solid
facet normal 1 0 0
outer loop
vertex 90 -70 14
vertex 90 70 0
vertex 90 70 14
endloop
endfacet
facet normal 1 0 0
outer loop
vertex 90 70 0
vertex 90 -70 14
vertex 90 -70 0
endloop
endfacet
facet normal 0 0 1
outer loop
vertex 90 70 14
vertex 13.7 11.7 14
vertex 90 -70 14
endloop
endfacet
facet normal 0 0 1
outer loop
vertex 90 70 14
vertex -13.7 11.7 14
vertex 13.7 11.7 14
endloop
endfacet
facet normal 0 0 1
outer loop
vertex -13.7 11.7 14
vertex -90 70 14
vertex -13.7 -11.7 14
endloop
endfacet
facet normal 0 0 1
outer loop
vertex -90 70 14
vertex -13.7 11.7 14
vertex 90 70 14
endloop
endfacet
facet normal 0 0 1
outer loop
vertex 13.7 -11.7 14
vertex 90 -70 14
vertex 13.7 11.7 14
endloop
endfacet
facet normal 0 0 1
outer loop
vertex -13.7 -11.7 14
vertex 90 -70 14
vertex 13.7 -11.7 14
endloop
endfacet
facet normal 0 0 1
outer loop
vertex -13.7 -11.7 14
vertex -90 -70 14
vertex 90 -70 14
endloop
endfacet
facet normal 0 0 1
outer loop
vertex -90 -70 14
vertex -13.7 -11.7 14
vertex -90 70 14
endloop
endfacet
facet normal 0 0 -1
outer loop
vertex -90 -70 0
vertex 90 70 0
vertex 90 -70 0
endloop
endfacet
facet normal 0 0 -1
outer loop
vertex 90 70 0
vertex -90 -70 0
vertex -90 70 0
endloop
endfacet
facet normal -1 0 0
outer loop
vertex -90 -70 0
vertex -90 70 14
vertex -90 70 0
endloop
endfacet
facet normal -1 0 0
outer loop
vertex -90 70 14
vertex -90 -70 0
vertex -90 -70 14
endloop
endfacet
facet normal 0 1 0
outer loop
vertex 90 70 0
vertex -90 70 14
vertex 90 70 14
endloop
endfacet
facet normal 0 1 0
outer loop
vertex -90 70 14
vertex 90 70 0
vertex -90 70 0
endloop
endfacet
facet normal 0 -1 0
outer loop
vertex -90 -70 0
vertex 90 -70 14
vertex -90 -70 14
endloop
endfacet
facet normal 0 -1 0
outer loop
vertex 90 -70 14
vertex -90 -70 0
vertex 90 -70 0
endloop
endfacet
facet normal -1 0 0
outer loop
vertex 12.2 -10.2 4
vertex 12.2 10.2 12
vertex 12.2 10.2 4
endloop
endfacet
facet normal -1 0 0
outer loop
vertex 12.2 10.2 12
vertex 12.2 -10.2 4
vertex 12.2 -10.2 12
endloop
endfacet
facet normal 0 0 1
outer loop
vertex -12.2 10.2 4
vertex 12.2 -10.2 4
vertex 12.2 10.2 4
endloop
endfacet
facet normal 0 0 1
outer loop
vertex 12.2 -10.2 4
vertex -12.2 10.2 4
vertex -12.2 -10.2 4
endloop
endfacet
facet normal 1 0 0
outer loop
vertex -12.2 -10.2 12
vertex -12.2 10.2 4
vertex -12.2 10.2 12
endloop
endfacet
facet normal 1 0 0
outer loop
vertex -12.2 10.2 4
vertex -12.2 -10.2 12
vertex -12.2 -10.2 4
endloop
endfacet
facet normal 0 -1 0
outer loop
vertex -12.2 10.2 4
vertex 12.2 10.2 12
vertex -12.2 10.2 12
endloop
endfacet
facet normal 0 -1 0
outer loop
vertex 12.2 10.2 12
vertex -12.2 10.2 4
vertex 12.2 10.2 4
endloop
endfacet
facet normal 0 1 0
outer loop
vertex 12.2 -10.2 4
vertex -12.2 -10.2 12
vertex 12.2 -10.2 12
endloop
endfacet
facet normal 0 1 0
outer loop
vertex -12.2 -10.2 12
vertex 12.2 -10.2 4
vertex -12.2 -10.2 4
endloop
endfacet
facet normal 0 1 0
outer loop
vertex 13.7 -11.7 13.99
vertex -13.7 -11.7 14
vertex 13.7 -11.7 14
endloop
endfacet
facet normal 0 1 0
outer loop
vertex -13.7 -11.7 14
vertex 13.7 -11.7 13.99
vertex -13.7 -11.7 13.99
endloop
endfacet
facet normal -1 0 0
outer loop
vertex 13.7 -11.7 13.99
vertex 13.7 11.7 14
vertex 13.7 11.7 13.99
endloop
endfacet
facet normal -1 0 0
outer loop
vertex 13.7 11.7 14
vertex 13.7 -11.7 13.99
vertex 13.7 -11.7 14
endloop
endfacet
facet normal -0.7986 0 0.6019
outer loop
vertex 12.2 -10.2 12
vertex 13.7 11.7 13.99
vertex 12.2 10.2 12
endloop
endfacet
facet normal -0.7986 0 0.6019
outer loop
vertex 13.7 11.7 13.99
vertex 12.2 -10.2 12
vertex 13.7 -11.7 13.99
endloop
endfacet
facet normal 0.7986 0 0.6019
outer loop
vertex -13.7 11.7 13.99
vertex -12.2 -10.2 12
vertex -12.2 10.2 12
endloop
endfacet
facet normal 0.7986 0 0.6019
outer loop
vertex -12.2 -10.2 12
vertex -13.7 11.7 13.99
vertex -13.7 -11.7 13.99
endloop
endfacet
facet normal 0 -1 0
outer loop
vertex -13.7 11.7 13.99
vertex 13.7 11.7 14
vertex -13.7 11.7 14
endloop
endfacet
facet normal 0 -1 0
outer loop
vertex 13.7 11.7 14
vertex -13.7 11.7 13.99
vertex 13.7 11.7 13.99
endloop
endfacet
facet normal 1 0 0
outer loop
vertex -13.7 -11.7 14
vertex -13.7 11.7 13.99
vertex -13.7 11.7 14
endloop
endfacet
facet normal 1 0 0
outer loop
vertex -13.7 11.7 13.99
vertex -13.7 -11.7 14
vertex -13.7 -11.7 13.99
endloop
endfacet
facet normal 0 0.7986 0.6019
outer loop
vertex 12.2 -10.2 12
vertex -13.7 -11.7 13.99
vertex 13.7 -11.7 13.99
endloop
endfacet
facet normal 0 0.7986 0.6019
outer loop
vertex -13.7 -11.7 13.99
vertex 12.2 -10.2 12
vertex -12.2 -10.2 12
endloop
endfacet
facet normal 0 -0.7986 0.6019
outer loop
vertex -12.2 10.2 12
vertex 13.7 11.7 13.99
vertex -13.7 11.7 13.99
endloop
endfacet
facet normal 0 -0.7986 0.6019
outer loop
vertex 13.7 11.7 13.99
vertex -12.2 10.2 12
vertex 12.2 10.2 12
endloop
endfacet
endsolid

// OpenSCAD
// Headphone stand: base, post, hanger. Units mm. Print orientation = export orientation (+Z up).
part = "base"; // [base, post, hanger, assembly]
cadverify_only = "";

/* Parameters */
base_L = 180; base_W = 140; base_H = 14;
base_sock_L = 24.4; base_sock_W = 20.4; base_sock_D = 10; // depth from top
base_floor = base_H - base_sock_D; // 4
base_cham_H = 2; base_cham_extra = 1.5; // per side funnel

post_low_L = 24; post_low_W = 20; post_low_H = 10;
post_flare_H = 6;
post_shaft_L = 34; post_shaft_W = 28;
post_shaft_bot = post_low_H + post_flare_H; // 16
post_shaft_top = 230;
post_shaft_H = post_shaft_top - post_shaft_bot; // 214
post_up_L = 20; post_up_W = 16; post_up_H = 12;
post_up_cham_H = 1.5; post_up_cham_extra = 1.5; // per side taper at top
post_H = post_shaft_top + post_up_H; // 242

hanger_L = 120; hanger_W = 36; hanger_base_H = 14; hanger_R = 18; // half-cyl radius = W/2
hanger_cyl_H = 18; // cylinder peak 14+18=32
lip_L = 10; lip_W = 36; lip_bot = 14; lip_top = 36; // end stops 14..36
hanger_H = 36;
hanger_sock_L = 20.4; hanger_sock_W = 16.4; hanger_sock_D = 12; // straight depth from bottom
hanger_roof_H = 10; // triangular roof above straight, ridge along X
hanger_cham_H = 2; hanger_cham_extra = 1.5;

asm_post_Z = base_floor; // 4, post bottom in assembly
asm_hanger_Z = 234; // hanger bottom in assembly
// shaft top 230 + post bottom 4 = 234 = hanger bottom; tenon 230..242 -> hanger 0..12; hanger top 234+36=270

module instance(name, part, unit = 1) {
    echo(cadverify_instance = [name, part, unit]);
    if (cadverify_only == "" || cadverify_only == name) children();
}

module base_part() {
    difference() {
        translate([-base_L/2, -base_W/2, 0]) cube([base_L, base_W, base_H]);
        // straight socket
        translate([-base_sock_L/2, -base_sock_W/2, base_floor])
            cube([base_sock_L, base_sock_W, base_sock_D+0.01]);
        // entry funnel (frustum widening upward)
        hull() {
            translate([-base_sock_L/2, -base_sock_W/2, base_H-base_cham_H])
                cube([base_sock_L, base_sock_W, 0.01]);
            translate([-(base_sock_L/2+base_cham_extra), -(base_sock_W/2+base_cham_extra), base_H-0.01])
                cube([base_sock_L+2*base_cham_extra, base_sock_W+2*base_cham_extra, 0.01]);
        }
    }
}

module post_part() {
    // lower tenon (press fit into base)
    translate([-post_low_L/2, -post_low_W/2, 0]) cube([post_low_L, post_low_W, post_low_H]);
    // flare collar 45deg-compatible transition to shaft
    hull() {
        translate([-post_low_L/2, -post_low_W/2, post_low_H-0.01])
            cube([post_low_L, post_low_W, 0.01]);
        translate([-post_shaft_L/2, -post_shaft_W/2, post_shaft_bot-0.01])
            cube([post_shaft_L, post_shaft_W, 0.01]);
    }
    // shaft
    translate([-post_shaft_L/2, -post_shaft_W/2, post_shaft_bot])
        cube([post_shaft_L, post_shaft_W, post_shaft_H]);
    // upper tenon straight part
    translate([-post_up_L/2, -post_up_W/2, post_shaft_top])
        cube([post_up_L, post_up_W, post_up_H-post_up_cham_H]);
    // upper tenon lead chamfer (tapers inward going up)
    hull() {
        translate([-post_up_L/2, -post_up_W/2, post_H-post_up_cham_H-0.01])
            cube([post_up_L, post_up_W, 0.01]);
        translate([-(post_up_L/2-post_up_cham_extra), -(post_up_W/2-post_up_cham_extra), post_H-0.01])
            cube([post_up_L-2*post_up_cham_extra, post_up_W-2*post_up_cham_extra, 0.01]);
    }
}

module hanger_part() {
    difference() {
        union() {
            // base box
            translate([-hanger_L/2, -hanger_W/2, 0]) cube([hanger_L, hanger_W, hanger_base_H]);
            // rounded top: half cylinder along X
            intersection() {
                translate([0, 0, hanger_base_H]) rotate([0, 90, 0])
                    cylinder(r=hanger_R, h=hanger_L, center=true, $fn=128);
                translate([-hanger_L/2, -hanger_W/2, hanger_base_H]) cube([hanger_L, hanger_W, hanger_cyl_H]);
            }
            // end stops (full height from base top, no floating ledge)
            for (sx=[-1,1])
                translate([sx*(hanger_L/2-lip_L), -lip_W/2, lip_bot])
                    cube([lip_L, lip_W, lip_top-lip_bot]);
        }
        // straight socket
        translate([-hanger_sock_L/2, -hanger_sock_W/2, 0])
            cube([hanger_sock_L, hanger_sock_W, hanger_sock_D]);
        // entry funnel at mouth (widens downward)
        hull() {
            translate([-hanger_sock_L/2, -hanger_sock_W/2, hanger_cham_H])
                cube([hanger_sock_L, hanger_sock_W, 0.01]);
            translate([-(hanger_sock_L/2+hanger_cham_extra), -(hanger_sock_W/2+hanger_cham_extra), -0.01])
                cube([hanger_sock_L+2*hanger_cham_extra, hanger_sock_W+2*hanger_cham_extra, 0.01]);
        }
        // pointed roof above straight (ridge along X), self-supporting slopes
        // closed wedge: sharp apex edge, no flat -> no overhang patch
        polyhedron(
            points = [
                [-hanger_sock_L/2, -hanger_sock_W/2, hanger_sock_D],
                [ hanger_sock_L/2, -hanger_sock_W/2, hanger_sock_D],
                [ hanger_sock_L/2,  hanger_sock_W/2, hanger_sock_D],
                [-hanger_sock_L/2,  hanger_sock_W/2, hanger_sock_D],
                [-hanger_sock_L/2, 0, hanger_sock_D+hanger_roof_H],
                [ hanger_sock_L/2, 0, hanger_sock_D+hanger_roof_H]
            ],
            faces = [
                [0, 1, 2, 3],
                [0, 4, 5, 1],
                [2, 5, 4, 3],
                [0, 3, 4],
                [1, 5, 2]
            ]
        );
    }
}

// --- specs (print coords) ---
if (part == "base") {
    echo(cadverify_spec = [
        ["bounds", [[-base_L/2, -base_W/2, 0], [base_L/2, base_W/2, base_H]]],
        ["bodies", 1],
        ["through_holes", 0],
        ["support_faces", [["base_bottom", "-z", 20000]]],
        ["overhangs_allowed", []],
        ["copies", 1],
        ["details", [
            ["base_plate", "material", [[50, 40, 0], [80, 60, base_H]], 0.9],
            ["socket", "void", [[-base_sock_L/2, -base_sock_W/2, base_floor], [base_sock_L/2, base_sock_W/2, base_H]], 0.9],
            ["socket_funnel", "void", [[-(base_sock_L/2+base_cham_extra), -(base_sock_W/2+base_cham_extra), base_H-base_cham_H], [base_sock_L/2+base_cham_extra, base_sock_W/2+base_cham_extra, base_H]], 0.7],
            ["floor", "thickness", [0, 0, -1], [0, 0, 1], base_floor],
            ["top_face", "view", [[-60, -50, base_H-1], [60, 50, base_H+1]]]
        ]]
    ]);
    base_part();
} else if (part == "post") {
    echo(cadverify_spec = [
        ["bounds", [[-post_shaft_L/2, -post_shaft_W/2, 0], [post_shaft_L/2, post_shaft_W/2, post_H]]],
        ["bodies", 1],
        ["through_holes", 0],
        ["support_faces", [["post_bottom", "-z", 400]]],
        ["overhangs_allowed", []],
        ["copies", 1],
        ["details", [
            ["shaft", "material", [[-10, -8, 60], [10, 8, 160]], 0.9],
            ["lower_tenon", "material", [[-post_low_L/2, -post_low_W/2, 0], [post_low_L/2, post_low_W/2, post_low_H]], 0.9],
            ["upper_tenon", "material", [[-post_up_L/2, -post_up_W/2, post_shaft_top], [post_up_L/2, post_up_W/2, post_H]], 0.8],
            ["collar", "material", [[-14, -12, post_low_H], [14, 12, post_shaft_bot]], 0.7],
            ["shaft_wall", "thickness", [30, 0, 116], [-1, 0, 0], post_shaft_L],
            ["tenon_tip", "view", [[-post_up_L/2, -post_up_W/2, post_H-4], [post_up_L/2, post_up_W/2, post_H+1]]]
        ]]
    ]);
    post_part();
} else if (part == "hanger") {
    echo(cadverify_spec = [
        ["bounds", [[-hanger_L/2, -hanger_W/2, 0], [hanger_L/2, hanger_W/2, hanger_H]]],
        ["bodies", 1],
        ["through_holes", 0],
        ["support_faces", [["hanger_bottom", "-z", 3000]]],
        ["overhangs_allowed", []],
        ["copies", 1],
        ["details", [
            ["saddle", "material", [[-40, -8, 20], [40, 8, 26]], 0.9],
            ["end_stop", "material", [[hanger_L/2-lip_L, -lip_W/2, lip_bot], [hanger_L/2, lip_W/2, lip_top]], 0.9],
            ["socket", "void", [[-hanger_sock_L/2, -hanger_sock_W/2, 0], [hanger_sock_L/2, hanger_sock_W/2, hanger_sock_D]], 0.9],
            ["socket_funnel", "void", [[-(hanger_sock_L/2+hanger_cham_extra), -(hanger_sock_W/2+hanger_cham_extra), 0], [hanger_sock_L/2+hanger_cham_extra, hanger_sock_W/2+hanger_cham_extra, hanger_cham_H]], 0.7],
            ["top_skin", "thickness", [0, 0, hanger_H+4], [0, 0, -1], (hanger_base_H+hanger_cyl_H)-(hanger_sock_D+hanger_roof_H)],
            ["round_top", "view", [[-40, -hanger_W/2, hanger_base_H], [40, hanger_W/2, hanger_base_H+hanger_cyl_H+1]]]
        ]]
    ]);
    hanger_part();
} else if (part == "assembly") {
    echo(cadverify_spec = [
        ["bounds", [[-base_L/2, -base_W/2, 0], [base_L/2, base_W/2, asm_hanger_Z+hanger_H]]],
        ["support_faces", [["desk", "-z", 20000]]],
        ["allowed_interferences", []],
        ["motions", []],
        ["assembly_order", [
            [[ "base_inst" ], [0, 0, 0]],
            [[ "post_inst" ], [0, 0, -1]],
            [[ "hanger_inst" ], [0, 0, -1]]
        ]],
        ["overhangs_allowed", []]
    ]);
    instance("base_inst", "base") base_part();
    instance("post_inst", "post") translate([0, 0, asm_post_Z]) post_part();
    instance("hanger_inst", "hanger") translate([0, 0, asm_hanger_Z]) hanger_part();
}
